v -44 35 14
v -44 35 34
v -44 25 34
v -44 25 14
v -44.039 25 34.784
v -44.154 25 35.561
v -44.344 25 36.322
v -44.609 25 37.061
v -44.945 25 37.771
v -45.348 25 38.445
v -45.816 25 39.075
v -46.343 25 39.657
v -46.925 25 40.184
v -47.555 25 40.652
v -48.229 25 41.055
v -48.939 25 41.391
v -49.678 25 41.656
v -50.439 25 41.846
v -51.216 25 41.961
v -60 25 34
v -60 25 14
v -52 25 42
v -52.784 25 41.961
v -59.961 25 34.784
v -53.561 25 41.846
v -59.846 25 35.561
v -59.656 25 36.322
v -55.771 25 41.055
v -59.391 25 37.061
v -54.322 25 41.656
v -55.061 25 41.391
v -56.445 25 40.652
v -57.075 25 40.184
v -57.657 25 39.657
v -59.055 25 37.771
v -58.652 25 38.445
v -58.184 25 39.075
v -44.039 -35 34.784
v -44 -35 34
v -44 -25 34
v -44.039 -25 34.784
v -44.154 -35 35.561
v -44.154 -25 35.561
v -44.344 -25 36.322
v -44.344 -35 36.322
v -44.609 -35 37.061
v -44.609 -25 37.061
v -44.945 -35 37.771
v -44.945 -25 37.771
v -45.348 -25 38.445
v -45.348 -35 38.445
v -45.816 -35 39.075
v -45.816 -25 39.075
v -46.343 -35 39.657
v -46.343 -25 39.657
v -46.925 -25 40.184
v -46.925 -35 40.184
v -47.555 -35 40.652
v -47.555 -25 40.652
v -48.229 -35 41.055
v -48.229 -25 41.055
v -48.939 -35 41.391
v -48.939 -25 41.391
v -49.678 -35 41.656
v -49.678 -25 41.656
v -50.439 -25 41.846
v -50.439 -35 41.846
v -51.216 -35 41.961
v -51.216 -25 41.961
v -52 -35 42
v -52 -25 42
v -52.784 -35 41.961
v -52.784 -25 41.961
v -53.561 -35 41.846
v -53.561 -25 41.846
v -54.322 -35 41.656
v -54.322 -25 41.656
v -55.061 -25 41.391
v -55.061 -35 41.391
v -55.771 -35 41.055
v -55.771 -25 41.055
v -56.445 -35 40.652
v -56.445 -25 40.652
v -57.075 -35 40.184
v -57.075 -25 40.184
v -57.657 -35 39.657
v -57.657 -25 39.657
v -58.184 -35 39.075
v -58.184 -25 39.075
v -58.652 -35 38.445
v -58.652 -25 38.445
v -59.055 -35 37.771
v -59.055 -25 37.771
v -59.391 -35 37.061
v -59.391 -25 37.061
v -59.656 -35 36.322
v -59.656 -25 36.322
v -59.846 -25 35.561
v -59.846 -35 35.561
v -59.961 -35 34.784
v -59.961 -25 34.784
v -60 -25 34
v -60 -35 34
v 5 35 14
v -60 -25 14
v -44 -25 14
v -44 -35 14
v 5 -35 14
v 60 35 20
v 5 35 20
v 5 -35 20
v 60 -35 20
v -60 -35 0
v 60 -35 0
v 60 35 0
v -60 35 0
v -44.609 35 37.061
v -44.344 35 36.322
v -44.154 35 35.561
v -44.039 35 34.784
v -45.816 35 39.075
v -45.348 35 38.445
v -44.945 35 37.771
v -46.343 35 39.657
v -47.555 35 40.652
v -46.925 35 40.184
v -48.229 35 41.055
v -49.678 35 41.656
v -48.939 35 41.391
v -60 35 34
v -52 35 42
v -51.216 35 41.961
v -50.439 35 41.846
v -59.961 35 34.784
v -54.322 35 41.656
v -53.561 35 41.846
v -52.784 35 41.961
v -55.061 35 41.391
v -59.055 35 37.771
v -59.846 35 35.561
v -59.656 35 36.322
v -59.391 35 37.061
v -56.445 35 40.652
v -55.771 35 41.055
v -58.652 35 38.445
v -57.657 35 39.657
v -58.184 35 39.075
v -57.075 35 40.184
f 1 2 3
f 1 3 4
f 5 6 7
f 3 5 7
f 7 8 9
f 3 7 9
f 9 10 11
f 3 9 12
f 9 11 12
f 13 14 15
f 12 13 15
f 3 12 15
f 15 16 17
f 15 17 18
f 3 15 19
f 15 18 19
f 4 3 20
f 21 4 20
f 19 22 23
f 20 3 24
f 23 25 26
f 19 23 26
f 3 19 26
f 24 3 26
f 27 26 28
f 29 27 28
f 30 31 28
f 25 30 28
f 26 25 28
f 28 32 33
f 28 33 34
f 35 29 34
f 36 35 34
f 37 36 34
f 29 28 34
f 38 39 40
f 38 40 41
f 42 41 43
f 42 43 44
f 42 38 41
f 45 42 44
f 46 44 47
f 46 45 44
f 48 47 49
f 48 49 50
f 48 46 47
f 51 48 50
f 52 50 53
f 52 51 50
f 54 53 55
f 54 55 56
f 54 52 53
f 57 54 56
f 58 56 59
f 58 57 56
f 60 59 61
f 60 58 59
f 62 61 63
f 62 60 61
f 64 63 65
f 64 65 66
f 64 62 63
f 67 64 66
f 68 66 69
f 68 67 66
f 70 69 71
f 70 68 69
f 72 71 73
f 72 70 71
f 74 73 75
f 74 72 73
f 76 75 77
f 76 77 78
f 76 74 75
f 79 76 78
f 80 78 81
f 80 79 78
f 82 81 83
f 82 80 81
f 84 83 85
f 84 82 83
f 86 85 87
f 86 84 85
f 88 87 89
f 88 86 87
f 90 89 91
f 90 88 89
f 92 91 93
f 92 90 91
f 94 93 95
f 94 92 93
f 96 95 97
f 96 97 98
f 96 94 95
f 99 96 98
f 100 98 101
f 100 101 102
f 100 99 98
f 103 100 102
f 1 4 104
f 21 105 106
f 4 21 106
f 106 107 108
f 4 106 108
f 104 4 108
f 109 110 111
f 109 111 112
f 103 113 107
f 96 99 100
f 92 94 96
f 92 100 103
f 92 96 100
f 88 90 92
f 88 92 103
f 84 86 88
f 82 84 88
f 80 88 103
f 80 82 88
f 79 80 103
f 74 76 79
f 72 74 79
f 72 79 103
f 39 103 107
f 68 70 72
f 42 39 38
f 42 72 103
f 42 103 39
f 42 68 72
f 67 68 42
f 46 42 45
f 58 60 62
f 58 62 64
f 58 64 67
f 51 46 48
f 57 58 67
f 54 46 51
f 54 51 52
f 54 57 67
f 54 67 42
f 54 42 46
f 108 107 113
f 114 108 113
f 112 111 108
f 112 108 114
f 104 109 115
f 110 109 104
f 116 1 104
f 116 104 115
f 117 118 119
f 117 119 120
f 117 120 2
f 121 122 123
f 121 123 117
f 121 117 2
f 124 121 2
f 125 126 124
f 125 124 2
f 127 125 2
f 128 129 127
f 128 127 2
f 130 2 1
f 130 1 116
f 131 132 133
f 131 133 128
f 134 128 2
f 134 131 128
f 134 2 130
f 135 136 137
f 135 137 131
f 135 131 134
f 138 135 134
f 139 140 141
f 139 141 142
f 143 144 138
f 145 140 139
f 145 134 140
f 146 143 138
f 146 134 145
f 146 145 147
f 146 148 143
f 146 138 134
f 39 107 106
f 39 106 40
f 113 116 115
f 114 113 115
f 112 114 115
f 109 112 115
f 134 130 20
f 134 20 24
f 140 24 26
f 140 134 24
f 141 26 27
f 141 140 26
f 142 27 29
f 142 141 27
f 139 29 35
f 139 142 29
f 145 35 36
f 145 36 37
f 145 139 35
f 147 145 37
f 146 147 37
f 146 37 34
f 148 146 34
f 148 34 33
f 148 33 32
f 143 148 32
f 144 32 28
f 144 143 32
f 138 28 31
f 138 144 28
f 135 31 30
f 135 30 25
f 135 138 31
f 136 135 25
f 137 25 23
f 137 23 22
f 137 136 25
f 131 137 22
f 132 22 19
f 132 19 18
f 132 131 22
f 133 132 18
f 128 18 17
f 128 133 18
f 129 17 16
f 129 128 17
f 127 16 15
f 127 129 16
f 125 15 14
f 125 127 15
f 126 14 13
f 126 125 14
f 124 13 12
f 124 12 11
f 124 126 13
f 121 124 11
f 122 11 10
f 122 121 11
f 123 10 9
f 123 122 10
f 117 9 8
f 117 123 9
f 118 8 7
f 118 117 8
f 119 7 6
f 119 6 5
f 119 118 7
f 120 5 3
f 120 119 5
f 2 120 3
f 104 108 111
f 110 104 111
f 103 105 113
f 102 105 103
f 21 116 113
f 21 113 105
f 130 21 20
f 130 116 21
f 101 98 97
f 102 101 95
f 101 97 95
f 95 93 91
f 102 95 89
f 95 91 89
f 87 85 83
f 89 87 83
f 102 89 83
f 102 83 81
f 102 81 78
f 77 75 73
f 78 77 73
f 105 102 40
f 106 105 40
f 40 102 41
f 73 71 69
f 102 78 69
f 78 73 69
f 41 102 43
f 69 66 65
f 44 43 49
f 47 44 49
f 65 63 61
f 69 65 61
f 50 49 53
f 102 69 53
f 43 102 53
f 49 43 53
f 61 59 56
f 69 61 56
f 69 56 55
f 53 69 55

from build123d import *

# Parameters (mm, degrees)
F0_W     = 120
F0_H     = 70
F1_DEPTH = 20
F2_W     = 65
F2_H     = 6
F3_DEPTH = 100
F5_DEPTH = 10
F7_DEPTH = 10


with BuildPart() as f1:
    # F0 (on Top) → F1 (new body)
    with BuildSketch(Plane.XY):
        Rectangle(F0_W, F0_H)
    extrude(amount=F1_DEPTH)

    # F2 (on face) → F3 (cut)
    with BuildSketch(Plane.XZ.offset(35)):
        with Locations((-27.5, 17)):
            Rectangle(F2_W, F2_H)
    extrude(amount=-F3_DEPTH, mode=Mode.SUBTRACT)

    # F4 (on face) → F5 (join)
    with BuildSketch(Plane.XZ.offset(35)):
        with BuildLine():
            ThreePointArc((-44, 34), (-52, 42), (-60, 34))
            Line((-60, 34), (-44, 34))
        make_face()
        with BuildLine():
            Line((-44, 34), (-60, 34))
            ThreePointArc((-60, 34), (-52, 26), (-44, 34))
        make_face()
        with BuildLine():
            Line((-60, 34), (-60, 14))
            Line((-60, 14), (-44, 14))
            Line((-44, 14), (-44, 34))
            ThreePointArc((-44, 34), (-52, 26), (-60, 34))
        make_face()
    extrude(amount=-F5_DEPTH)

    # F6 (on face) → F7 (join)
    with BuildSketch(Plane(origin=(0, 35, 0), x_dir=(-1, 0, 0), z_dir=(0, 1, 0))):
        with BuildLine():
            Line((44, 14), (60, 14))
            Line((60, 14), (60, 34))
            ThreePointArc((60, 34), (52, 26), (44, 34))
            Line((44, 34), (44, 14))
        make_face()
        with BuildLine():
            ThreePointArc((44, 34), (52, 26), (60, 34))
            Line((60, 34), (44, 34))
        make_face()
        with BuildLine():
            Line((44, 34), (60, 34))
            ThreePointArc((60, 34), (52, 42), (44, 34))
        make_face()
    extrude(amount=-F7_DEPTH)


solid = f1.part
